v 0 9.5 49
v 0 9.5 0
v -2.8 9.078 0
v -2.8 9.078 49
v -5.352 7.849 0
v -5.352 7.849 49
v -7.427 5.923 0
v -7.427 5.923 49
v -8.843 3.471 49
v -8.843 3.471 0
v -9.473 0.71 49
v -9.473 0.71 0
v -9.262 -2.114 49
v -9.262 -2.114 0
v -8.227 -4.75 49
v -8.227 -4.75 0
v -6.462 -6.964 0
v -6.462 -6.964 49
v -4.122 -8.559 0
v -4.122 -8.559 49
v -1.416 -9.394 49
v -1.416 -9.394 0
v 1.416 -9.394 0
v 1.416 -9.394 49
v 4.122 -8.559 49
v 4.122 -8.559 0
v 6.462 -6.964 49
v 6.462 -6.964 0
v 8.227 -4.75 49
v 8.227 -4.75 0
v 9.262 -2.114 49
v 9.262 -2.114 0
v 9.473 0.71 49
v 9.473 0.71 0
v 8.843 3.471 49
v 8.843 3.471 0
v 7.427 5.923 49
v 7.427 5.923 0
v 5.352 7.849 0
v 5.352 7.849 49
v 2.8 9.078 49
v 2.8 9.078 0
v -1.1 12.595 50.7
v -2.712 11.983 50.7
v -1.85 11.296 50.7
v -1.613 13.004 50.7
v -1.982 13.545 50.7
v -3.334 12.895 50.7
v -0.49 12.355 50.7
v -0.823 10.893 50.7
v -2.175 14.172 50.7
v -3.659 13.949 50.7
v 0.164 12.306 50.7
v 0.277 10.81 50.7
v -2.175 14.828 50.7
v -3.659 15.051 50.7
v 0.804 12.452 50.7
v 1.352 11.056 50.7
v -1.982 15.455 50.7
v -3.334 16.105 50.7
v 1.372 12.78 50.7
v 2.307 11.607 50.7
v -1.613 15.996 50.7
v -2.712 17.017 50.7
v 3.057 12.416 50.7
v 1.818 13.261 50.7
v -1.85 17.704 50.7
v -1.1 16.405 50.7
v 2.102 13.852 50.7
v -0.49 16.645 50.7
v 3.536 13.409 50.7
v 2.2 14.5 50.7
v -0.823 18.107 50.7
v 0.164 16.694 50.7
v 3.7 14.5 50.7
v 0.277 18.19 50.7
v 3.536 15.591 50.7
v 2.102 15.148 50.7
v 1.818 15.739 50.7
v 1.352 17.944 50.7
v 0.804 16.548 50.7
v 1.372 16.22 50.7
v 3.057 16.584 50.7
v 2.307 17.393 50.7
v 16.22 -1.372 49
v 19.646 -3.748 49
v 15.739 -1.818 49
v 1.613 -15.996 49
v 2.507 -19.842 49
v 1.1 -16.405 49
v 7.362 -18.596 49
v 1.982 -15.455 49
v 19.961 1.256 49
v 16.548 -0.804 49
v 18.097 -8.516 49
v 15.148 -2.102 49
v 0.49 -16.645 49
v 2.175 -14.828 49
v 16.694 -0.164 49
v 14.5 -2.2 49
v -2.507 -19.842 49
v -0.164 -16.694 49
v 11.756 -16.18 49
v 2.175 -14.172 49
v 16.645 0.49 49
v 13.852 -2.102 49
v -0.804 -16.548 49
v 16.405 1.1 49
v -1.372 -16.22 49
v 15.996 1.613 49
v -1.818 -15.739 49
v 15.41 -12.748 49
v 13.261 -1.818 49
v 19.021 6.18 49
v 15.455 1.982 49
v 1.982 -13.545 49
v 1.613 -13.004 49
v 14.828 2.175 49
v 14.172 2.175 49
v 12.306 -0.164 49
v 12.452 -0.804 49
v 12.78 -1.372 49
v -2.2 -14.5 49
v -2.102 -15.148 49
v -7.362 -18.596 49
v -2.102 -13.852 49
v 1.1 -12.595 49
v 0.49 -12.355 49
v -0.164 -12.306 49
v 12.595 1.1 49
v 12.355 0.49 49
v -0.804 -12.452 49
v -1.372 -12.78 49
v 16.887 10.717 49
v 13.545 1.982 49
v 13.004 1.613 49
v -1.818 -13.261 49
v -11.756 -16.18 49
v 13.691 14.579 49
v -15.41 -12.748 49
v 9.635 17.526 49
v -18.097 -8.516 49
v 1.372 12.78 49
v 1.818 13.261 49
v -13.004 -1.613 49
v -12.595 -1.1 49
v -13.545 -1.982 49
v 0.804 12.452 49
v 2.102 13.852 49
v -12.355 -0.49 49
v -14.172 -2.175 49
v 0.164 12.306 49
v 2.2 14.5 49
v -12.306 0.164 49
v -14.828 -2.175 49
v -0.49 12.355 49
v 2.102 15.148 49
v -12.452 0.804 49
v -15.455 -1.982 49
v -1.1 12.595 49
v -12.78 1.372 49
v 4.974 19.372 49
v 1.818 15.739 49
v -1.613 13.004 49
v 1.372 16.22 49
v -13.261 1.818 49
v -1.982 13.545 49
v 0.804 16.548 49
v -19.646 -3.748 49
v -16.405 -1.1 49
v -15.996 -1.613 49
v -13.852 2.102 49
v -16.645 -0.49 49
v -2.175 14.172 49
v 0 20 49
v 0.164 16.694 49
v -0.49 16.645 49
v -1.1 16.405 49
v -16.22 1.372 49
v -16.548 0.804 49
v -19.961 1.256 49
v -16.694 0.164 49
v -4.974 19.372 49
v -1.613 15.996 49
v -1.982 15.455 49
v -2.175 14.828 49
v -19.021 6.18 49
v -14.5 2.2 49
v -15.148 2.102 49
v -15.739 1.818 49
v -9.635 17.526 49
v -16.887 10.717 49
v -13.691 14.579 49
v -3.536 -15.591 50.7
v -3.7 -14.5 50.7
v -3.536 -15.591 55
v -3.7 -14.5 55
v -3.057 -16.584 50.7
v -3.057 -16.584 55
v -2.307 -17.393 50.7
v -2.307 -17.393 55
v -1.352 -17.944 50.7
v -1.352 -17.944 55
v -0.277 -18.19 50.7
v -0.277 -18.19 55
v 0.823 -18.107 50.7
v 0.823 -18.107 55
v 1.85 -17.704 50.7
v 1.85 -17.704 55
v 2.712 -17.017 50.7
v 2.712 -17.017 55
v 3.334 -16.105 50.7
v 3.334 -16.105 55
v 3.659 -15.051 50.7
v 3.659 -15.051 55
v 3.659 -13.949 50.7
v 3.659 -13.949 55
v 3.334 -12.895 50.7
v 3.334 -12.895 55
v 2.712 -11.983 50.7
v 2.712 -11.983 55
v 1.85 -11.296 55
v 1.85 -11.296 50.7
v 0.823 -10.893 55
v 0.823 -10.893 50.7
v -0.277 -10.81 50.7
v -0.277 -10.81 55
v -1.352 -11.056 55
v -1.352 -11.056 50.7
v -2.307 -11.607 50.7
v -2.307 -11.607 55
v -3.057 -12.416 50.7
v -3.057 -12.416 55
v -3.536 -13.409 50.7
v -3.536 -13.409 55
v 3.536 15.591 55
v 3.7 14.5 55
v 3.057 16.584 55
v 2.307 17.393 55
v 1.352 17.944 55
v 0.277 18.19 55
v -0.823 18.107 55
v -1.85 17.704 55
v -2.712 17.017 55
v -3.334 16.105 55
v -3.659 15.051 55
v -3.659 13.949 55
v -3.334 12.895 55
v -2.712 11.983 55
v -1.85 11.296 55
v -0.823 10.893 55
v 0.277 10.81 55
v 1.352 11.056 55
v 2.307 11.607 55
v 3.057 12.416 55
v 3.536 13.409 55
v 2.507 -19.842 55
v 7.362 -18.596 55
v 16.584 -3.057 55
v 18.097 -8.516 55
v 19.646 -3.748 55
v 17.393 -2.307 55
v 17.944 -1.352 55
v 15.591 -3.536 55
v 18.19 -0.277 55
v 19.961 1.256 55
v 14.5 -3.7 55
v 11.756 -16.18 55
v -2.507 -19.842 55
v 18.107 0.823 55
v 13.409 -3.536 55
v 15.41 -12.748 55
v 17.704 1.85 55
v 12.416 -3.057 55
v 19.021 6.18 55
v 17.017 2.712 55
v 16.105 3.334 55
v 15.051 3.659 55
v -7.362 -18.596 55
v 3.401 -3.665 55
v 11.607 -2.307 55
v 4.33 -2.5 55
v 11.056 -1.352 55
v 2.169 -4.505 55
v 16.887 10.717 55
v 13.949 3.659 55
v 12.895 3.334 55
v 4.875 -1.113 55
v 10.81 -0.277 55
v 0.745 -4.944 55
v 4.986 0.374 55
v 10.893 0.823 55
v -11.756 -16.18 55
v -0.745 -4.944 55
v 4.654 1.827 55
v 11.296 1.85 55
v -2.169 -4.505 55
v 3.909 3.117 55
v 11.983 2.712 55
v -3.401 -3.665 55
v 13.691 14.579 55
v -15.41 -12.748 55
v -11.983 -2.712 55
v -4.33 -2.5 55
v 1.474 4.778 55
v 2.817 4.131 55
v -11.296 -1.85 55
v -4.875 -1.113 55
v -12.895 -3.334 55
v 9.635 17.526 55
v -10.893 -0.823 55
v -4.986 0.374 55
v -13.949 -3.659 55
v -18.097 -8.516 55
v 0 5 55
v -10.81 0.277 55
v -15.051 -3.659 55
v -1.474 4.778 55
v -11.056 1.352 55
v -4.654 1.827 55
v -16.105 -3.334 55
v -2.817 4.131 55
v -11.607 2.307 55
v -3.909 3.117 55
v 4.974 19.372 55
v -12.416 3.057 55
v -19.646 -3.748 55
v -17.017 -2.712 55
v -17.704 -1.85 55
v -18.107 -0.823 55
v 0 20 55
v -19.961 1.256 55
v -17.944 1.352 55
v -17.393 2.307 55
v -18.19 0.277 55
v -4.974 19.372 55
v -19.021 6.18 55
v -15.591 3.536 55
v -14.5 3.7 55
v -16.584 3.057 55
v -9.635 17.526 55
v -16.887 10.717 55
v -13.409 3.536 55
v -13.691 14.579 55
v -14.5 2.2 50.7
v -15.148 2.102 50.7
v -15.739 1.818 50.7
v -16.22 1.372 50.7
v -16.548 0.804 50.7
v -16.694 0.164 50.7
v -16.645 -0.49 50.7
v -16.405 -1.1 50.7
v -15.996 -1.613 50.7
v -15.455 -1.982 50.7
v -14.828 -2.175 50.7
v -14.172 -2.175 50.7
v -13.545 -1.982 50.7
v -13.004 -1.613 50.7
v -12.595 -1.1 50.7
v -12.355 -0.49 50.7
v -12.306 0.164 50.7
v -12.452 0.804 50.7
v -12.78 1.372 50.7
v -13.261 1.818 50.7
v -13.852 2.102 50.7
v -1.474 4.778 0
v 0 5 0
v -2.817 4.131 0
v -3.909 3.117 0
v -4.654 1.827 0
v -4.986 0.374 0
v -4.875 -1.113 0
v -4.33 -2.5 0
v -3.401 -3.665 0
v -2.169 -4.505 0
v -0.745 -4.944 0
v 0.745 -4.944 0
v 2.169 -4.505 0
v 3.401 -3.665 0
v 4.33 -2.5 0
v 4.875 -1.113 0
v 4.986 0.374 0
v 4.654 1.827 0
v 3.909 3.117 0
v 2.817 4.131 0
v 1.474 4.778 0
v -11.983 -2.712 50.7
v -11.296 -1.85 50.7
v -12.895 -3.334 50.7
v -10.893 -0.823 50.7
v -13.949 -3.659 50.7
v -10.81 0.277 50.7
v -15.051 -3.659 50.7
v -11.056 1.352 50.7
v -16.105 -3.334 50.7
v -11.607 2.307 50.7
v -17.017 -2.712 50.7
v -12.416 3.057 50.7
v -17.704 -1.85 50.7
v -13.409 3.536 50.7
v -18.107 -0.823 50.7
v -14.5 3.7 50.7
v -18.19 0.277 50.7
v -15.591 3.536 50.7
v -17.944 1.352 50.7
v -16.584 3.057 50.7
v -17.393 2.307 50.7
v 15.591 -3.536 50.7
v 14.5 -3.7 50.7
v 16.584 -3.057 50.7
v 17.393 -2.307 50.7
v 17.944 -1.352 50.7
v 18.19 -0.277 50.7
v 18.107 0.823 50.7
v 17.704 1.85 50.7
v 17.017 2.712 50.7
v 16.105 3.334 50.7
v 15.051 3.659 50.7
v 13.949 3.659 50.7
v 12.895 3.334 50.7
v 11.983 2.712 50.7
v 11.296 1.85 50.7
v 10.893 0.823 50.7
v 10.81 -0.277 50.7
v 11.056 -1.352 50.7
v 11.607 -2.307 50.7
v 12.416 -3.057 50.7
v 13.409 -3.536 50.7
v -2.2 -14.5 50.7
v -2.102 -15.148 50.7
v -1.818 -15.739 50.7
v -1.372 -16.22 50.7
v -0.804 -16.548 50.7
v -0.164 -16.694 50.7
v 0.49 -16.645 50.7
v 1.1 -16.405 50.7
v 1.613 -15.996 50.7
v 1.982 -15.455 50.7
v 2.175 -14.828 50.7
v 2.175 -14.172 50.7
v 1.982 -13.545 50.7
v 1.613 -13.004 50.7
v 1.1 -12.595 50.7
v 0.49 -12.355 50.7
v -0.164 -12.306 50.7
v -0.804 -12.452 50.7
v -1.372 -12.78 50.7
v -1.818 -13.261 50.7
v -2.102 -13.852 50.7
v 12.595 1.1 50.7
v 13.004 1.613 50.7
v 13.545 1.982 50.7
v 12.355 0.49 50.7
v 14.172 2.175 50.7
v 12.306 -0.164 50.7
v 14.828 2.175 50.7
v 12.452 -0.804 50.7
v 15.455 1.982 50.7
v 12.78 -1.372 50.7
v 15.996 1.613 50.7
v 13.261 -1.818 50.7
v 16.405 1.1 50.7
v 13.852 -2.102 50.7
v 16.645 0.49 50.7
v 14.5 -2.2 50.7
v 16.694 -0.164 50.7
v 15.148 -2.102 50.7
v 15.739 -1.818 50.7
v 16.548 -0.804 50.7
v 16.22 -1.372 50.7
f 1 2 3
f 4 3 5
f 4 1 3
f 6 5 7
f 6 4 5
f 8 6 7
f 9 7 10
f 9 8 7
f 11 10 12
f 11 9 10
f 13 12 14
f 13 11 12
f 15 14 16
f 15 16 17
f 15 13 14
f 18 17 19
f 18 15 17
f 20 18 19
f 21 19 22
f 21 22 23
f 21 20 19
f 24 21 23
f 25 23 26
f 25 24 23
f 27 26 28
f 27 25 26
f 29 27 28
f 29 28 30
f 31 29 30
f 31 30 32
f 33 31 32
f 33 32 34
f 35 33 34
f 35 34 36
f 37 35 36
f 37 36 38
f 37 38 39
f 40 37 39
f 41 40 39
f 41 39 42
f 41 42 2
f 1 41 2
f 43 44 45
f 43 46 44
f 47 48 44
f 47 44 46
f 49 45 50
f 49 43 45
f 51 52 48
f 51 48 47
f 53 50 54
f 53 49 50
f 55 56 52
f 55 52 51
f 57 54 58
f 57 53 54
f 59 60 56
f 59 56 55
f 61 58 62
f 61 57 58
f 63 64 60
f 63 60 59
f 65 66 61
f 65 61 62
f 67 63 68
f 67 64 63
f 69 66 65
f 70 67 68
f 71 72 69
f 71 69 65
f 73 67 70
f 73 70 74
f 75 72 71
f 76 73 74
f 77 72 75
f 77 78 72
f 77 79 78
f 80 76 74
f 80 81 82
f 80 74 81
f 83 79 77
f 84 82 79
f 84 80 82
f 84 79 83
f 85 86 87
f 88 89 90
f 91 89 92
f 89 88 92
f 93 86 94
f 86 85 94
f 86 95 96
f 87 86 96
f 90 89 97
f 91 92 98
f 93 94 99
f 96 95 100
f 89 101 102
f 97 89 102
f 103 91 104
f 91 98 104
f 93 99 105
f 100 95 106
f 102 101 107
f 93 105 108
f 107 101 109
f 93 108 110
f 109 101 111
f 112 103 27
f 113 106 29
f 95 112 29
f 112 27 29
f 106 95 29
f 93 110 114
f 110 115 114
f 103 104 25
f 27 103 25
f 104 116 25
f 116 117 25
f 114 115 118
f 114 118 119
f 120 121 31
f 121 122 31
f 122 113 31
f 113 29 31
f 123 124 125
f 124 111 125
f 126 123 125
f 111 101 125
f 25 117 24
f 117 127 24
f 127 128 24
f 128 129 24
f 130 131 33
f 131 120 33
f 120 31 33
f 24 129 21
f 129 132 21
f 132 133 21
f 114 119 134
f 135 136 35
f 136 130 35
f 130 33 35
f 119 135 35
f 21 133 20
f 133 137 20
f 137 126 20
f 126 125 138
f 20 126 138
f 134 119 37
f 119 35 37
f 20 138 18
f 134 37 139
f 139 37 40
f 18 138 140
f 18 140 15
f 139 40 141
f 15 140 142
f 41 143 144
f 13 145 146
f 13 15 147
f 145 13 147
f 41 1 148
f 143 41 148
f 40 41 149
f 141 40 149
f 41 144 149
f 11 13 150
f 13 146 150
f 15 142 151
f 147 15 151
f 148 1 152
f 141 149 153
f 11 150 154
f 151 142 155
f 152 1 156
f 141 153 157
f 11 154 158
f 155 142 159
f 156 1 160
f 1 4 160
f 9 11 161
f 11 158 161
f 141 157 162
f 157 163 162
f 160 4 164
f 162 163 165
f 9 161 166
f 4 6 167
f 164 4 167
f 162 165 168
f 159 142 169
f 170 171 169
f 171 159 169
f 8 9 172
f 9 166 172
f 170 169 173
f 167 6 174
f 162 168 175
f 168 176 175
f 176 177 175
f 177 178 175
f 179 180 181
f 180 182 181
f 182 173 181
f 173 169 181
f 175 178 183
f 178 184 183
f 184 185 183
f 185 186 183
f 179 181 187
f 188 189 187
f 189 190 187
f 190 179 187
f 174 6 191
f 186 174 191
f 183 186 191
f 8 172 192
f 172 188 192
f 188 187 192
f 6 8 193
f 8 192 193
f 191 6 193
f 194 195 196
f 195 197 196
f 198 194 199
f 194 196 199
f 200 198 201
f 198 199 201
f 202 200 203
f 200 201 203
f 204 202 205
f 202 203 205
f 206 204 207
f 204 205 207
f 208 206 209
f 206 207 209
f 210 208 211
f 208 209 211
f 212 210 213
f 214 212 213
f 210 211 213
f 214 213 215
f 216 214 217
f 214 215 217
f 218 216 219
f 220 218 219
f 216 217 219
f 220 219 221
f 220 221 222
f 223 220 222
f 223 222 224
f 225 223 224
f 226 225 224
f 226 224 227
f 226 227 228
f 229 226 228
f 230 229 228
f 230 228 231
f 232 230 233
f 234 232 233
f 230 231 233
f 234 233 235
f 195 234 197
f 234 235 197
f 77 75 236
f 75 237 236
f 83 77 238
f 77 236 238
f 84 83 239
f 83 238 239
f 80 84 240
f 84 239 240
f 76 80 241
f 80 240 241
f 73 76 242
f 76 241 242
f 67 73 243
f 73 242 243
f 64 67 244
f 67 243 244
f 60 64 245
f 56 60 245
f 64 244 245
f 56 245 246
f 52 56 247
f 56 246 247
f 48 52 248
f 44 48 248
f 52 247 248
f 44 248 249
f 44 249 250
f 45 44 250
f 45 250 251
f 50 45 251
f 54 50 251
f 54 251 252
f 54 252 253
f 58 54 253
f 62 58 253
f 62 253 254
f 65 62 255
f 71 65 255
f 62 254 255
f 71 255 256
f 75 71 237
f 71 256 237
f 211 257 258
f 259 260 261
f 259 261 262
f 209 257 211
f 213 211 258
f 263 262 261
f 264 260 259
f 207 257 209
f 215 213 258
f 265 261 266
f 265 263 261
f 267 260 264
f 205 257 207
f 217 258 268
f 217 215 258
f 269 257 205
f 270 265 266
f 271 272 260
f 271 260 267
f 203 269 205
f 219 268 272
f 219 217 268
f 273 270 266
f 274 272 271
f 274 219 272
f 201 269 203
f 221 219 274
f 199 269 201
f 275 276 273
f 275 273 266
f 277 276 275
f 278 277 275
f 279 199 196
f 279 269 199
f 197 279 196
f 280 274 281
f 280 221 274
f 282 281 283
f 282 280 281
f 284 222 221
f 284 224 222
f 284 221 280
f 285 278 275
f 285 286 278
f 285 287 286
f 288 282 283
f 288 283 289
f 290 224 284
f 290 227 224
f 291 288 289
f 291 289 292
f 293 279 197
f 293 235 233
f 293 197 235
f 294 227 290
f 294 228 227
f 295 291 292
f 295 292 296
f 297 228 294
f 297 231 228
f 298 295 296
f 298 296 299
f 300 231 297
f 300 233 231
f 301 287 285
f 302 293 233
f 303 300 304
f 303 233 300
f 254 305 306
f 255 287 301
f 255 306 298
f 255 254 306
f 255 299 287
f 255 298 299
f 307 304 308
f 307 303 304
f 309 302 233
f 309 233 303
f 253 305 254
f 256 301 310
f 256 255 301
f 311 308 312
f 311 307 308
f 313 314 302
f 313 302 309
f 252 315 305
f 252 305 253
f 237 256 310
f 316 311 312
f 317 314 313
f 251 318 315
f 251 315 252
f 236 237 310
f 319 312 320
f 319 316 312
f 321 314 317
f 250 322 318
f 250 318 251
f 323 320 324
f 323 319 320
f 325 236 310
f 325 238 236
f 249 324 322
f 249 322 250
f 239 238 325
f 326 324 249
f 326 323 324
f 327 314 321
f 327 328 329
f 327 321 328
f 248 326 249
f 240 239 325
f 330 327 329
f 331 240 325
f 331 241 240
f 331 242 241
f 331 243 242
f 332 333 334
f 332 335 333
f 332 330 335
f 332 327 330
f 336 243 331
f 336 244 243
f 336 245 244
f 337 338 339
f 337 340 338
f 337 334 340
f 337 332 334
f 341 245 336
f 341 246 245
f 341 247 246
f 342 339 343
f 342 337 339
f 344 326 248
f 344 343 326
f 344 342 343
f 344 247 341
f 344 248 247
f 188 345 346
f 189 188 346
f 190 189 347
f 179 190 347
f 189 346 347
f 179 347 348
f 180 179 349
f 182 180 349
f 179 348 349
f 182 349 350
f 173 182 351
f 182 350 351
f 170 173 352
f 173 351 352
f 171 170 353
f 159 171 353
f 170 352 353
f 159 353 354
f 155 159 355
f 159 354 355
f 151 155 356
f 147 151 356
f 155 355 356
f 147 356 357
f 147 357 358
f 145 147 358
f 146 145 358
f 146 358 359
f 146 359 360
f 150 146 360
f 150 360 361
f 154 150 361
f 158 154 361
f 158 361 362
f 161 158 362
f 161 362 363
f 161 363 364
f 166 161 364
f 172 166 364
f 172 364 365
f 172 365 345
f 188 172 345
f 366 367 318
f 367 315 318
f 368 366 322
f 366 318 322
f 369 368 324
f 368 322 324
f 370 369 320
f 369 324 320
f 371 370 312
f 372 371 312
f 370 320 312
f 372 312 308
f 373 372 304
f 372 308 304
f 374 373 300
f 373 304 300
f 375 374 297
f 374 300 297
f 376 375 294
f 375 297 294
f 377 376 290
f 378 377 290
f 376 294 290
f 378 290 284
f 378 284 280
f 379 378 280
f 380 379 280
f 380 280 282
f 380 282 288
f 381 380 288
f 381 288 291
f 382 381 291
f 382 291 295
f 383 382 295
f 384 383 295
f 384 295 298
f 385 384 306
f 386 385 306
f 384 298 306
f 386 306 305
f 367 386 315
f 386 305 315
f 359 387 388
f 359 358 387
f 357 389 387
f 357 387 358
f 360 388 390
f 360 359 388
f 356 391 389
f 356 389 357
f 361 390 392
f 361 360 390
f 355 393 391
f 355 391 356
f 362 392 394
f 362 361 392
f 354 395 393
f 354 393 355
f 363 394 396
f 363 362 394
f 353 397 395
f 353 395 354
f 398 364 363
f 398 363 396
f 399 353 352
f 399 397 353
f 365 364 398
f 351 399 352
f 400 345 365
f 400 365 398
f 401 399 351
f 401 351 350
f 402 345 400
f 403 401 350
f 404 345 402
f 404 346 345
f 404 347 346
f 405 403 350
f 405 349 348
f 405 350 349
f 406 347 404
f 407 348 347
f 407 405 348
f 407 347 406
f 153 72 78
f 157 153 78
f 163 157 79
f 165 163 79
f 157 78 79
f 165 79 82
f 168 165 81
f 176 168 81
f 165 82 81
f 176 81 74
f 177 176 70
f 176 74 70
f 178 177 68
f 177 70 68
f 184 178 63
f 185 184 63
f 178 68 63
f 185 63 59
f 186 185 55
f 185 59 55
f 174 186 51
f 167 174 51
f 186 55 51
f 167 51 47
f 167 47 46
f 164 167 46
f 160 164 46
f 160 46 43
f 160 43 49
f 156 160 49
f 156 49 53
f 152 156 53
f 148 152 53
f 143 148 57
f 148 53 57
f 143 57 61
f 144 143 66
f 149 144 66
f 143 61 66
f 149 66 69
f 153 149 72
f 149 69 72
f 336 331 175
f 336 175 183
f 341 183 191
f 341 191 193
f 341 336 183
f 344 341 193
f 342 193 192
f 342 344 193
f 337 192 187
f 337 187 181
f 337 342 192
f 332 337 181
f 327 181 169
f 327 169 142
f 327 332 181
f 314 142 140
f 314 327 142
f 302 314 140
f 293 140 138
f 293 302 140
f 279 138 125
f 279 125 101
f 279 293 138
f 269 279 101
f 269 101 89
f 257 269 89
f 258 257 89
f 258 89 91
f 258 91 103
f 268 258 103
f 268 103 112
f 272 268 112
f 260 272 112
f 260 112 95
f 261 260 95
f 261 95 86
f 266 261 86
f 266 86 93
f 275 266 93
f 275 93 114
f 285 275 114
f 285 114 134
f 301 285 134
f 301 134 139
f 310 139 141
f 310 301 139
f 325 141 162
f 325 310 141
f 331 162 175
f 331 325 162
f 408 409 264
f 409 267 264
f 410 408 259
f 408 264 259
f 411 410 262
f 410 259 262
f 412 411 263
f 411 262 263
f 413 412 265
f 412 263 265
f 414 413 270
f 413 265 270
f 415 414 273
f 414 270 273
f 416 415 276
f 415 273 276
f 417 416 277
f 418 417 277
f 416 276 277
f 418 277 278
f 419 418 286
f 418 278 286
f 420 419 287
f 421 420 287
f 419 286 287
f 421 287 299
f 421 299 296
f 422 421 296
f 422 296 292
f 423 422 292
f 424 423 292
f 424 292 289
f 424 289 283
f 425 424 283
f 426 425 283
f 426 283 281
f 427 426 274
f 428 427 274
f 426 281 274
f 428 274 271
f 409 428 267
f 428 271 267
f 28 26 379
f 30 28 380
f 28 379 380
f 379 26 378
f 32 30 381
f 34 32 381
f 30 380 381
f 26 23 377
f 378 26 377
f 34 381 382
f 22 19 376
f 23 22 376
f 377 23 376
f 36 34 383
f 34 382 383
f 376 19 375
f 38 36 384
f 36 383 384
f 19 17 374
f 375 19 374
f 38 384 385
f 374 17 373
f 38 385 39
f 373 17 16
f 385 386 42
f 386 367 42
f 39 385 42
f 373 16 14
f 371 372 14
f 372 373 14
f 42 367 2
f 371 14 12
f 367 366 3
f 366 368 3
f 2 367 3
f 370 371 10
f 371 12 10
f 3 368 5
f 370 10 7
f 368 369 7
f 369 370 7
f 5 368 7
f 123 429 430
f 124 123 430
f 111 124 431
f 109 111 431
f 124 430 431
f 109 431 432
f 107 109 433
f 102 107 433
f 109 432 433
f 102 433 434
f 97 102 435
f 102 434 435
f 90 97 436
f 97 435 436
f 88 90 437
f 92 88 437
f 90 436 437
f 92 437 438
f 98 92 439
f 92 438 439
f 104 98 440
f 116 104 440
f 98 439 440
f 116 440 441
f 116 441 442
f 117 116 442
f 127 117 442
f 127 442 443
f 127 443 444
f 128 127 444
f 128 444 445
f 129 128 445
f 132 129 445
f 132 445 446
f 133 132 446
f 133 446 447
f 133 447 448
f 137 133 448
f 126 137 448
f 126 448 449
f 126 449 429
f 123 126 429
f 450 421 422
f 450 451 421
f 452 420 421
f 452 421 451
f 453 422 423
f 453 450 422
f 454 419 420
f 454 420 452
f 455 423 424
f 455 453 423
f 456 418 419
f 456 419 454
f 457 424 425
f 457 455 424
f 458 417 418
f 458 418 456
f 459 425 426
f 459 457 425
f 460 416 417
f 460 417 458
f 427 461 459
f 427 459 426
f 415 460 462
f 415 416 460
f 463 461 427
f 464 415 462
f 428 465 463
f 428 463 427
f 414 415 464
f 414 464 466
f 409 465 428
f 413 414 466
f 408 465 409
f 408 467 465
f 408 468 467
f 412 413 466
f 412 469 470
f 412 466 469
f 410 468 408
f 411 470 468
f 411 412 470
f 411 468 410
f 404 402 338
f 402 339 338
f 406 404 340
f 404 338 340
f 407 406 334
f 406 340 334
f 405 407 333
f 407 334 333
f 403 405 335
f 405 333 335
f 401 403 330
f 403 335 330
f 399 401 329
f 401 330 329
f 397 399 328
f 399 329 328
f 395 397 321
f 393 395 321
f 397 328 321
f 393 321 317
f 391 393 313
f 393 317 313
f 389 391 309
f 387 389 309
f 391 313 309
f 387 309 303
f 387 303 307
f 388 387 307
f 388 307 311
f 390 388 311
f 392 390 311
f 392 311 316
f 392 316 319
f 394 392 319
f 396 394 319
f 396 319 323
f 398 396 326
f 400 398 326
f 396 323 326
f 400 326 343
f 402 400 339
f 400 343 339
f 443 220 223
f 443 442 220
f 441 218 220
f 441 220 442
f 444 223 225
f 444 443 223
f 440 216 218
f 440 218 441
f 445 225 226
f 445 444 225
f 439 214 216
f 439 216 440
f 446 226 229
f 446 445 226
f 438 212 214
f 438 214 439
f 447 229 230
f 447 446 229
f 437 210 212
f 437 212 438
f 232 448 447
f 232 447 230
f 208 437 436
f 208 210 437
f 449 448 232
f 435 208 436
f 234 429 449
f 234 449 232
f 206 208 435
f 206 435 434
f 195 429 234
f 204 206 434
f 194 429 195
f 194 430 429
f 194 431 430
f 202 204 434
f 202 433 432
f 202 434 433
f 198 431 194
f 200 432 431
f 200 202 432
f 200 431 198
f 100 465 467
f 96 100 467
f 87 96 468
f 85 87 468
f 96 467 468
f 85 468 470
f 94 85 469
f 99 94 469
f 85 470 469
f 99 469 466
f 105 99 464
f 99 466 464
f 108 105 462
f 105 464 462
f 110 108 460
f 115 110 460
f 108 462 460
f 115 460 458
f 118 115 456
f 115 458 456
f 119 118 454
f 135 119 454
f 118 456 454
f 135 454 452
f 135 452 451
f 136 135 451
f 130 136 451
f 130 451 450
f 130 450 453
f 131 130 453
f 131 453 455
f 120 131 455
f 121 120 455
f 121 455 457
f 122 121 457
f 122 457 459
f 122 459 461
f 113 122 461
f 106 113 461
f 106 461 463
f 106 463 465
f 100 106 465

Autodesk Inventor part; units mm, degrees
ref_plane "YZ Plane" through (0, 0, 0) normal (1, 0, 0) x (0, 1, 0)
ref_plane "XZ Plane" through (0, 0, 0) normal (0, 1, 0) x (-1, 0, 0)
ref_plane "XY Plane" through (0, 0, 0) normal (0, 0, 1) x (1, 0, 0)
sketch "スケッチ2" plane through (0, 0, 0) normal (1, 0, 0) x (0, 1, 0)
  line L0 (5, 0) -> (9.5, 0)
  line L1 (9.5, 0) -> (9.5, 49)
  line L2 (9.5, 49) -> (20, 49)
  line L3 (20, 49) -> (20, 55)
  line L4 (20, 55) -> (5, 55)
  line L5 (5, 0) -> (5, 55)
  line L6 (0, -11) -> (0, 66) projected
  point P0 (0, 0)
  point P1 (0, 55)
  dimension "d0" = 9.5
  dimension "d1" = 55
  dimension "d2" = 6
  dimension "d3" = 20
  dimension "d4" = 5
revolve "回転1" add sketch "スケッチ2" angle 360 about axis through (0, 0, -10) along (0, 0, 1)
sketch "スケッチ3" plane through (0, 0, 55) normal (0, 0, 1) x (1, 0, 0)
  circle A0 centre (0, 14.5) radius 3.7
  point P0 (0, 0)
  dimension "d6" = 14.5
  dimension "d7" = 7.4
extrude "押し出し1" cut sketch "スケッチ3" against normal blind 4.3
sketch "スケッチ4" plane through (0, 14.5, 50.7) normal (0, 0, 1) x (1, 0, 0)
  circle A0 centre (0, 0) radius 2.2
  circle A1 centre (0, 0) radius 3.7 projected
  point P0 (0, -14.5)
  dimension "d10" = 4.4
extrude "押し出し2" cut sketch "スケッチ4" against normal through all contours A0
pattern_circular "円形状パターン1" count 4 over 360 about axis through (0, 0, -10) along (0, 0, 1) of "押し出し1", "押し出し2"
equation "\"d0\" = 0.5 * D"
equation "\"d1\" = L"
equation "\"d2\" = t"
equation "\"d3\" = 0.5 * Df"
equation "\"d4\" = 0.5 * dr"
equation "\"d6\" = 0.5 * PCD"
equation "\"D\" = 19"
equation "\"L\" = 55"
equation "\"t\" = 6"
equation "\"PCD\" = 29"
equation "\"Df\" = 40"
equation "\"dr\" = 10"
properties part number "NB_SMF10WW"
